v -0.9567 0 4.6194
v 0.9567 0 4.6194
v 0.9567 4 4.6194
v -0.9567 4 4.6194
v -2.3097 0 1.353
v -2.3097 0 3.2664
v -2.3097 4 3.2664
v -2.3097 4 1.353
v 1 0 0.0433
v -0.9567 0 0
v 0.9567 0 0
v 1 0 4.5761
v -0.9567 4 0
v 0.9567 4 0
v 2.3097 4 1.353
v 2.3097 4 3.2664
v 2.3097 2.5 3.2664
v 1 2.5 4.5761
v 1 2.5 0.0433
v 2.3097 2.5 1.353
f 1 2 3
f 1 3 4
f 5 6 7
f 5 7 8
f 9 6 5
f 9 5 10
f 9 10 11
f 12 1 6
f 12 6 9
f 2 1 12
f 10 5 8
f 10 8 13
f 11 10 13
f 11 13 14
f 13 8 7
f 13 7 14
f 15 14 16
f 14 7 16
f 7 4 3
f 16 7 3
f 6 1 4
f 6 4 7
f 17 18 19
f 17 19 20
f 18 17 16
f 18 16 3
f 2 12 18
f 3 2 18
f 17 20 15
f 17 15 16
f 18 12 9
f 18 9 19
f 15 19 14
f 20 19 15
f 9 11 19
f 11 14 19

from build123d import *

# Parameters (mm, degrees)
BOX008_W         = 2
BOX008_H         = 2.5
BOX008_DEPTH     = 6
EXTRUDE004_DEPTH = 4


with BuildPart() as box008:
    # Box008 → Box008 (new body)
    with BuildSketch(Plane(origin=(1, 0, -0.5), x_dir=(1, 0, 0), z_dir=(0, 0, 1))):
        with Locations((1, 1.25)):
            Rectangle(BOX008_W, BOX008_H)
    extrude(amount=BOX008_DEPTH)


with BuildPart() as octpin_wnotch:
    # Sketch002 → Extrude004 (new body)
    with BuildSketch(Plane.XZ):
        Polygon((2.309699, 1.35299), (2.309699, 3.266407), (0.956709, 4.619398), (-0.956709, 4.619398), (-2.309699, 3.266407), (-2.309699, 1.35299), (-0.956709, 0), (0.956709, 0), align=None)
    extrude(amount=-EXTRUDE004_DEPTH)

    # Cut: cut Box008
    add(box008.part, mode=Mode.SUBTRACT)


solid = octpin_wnotch.part
